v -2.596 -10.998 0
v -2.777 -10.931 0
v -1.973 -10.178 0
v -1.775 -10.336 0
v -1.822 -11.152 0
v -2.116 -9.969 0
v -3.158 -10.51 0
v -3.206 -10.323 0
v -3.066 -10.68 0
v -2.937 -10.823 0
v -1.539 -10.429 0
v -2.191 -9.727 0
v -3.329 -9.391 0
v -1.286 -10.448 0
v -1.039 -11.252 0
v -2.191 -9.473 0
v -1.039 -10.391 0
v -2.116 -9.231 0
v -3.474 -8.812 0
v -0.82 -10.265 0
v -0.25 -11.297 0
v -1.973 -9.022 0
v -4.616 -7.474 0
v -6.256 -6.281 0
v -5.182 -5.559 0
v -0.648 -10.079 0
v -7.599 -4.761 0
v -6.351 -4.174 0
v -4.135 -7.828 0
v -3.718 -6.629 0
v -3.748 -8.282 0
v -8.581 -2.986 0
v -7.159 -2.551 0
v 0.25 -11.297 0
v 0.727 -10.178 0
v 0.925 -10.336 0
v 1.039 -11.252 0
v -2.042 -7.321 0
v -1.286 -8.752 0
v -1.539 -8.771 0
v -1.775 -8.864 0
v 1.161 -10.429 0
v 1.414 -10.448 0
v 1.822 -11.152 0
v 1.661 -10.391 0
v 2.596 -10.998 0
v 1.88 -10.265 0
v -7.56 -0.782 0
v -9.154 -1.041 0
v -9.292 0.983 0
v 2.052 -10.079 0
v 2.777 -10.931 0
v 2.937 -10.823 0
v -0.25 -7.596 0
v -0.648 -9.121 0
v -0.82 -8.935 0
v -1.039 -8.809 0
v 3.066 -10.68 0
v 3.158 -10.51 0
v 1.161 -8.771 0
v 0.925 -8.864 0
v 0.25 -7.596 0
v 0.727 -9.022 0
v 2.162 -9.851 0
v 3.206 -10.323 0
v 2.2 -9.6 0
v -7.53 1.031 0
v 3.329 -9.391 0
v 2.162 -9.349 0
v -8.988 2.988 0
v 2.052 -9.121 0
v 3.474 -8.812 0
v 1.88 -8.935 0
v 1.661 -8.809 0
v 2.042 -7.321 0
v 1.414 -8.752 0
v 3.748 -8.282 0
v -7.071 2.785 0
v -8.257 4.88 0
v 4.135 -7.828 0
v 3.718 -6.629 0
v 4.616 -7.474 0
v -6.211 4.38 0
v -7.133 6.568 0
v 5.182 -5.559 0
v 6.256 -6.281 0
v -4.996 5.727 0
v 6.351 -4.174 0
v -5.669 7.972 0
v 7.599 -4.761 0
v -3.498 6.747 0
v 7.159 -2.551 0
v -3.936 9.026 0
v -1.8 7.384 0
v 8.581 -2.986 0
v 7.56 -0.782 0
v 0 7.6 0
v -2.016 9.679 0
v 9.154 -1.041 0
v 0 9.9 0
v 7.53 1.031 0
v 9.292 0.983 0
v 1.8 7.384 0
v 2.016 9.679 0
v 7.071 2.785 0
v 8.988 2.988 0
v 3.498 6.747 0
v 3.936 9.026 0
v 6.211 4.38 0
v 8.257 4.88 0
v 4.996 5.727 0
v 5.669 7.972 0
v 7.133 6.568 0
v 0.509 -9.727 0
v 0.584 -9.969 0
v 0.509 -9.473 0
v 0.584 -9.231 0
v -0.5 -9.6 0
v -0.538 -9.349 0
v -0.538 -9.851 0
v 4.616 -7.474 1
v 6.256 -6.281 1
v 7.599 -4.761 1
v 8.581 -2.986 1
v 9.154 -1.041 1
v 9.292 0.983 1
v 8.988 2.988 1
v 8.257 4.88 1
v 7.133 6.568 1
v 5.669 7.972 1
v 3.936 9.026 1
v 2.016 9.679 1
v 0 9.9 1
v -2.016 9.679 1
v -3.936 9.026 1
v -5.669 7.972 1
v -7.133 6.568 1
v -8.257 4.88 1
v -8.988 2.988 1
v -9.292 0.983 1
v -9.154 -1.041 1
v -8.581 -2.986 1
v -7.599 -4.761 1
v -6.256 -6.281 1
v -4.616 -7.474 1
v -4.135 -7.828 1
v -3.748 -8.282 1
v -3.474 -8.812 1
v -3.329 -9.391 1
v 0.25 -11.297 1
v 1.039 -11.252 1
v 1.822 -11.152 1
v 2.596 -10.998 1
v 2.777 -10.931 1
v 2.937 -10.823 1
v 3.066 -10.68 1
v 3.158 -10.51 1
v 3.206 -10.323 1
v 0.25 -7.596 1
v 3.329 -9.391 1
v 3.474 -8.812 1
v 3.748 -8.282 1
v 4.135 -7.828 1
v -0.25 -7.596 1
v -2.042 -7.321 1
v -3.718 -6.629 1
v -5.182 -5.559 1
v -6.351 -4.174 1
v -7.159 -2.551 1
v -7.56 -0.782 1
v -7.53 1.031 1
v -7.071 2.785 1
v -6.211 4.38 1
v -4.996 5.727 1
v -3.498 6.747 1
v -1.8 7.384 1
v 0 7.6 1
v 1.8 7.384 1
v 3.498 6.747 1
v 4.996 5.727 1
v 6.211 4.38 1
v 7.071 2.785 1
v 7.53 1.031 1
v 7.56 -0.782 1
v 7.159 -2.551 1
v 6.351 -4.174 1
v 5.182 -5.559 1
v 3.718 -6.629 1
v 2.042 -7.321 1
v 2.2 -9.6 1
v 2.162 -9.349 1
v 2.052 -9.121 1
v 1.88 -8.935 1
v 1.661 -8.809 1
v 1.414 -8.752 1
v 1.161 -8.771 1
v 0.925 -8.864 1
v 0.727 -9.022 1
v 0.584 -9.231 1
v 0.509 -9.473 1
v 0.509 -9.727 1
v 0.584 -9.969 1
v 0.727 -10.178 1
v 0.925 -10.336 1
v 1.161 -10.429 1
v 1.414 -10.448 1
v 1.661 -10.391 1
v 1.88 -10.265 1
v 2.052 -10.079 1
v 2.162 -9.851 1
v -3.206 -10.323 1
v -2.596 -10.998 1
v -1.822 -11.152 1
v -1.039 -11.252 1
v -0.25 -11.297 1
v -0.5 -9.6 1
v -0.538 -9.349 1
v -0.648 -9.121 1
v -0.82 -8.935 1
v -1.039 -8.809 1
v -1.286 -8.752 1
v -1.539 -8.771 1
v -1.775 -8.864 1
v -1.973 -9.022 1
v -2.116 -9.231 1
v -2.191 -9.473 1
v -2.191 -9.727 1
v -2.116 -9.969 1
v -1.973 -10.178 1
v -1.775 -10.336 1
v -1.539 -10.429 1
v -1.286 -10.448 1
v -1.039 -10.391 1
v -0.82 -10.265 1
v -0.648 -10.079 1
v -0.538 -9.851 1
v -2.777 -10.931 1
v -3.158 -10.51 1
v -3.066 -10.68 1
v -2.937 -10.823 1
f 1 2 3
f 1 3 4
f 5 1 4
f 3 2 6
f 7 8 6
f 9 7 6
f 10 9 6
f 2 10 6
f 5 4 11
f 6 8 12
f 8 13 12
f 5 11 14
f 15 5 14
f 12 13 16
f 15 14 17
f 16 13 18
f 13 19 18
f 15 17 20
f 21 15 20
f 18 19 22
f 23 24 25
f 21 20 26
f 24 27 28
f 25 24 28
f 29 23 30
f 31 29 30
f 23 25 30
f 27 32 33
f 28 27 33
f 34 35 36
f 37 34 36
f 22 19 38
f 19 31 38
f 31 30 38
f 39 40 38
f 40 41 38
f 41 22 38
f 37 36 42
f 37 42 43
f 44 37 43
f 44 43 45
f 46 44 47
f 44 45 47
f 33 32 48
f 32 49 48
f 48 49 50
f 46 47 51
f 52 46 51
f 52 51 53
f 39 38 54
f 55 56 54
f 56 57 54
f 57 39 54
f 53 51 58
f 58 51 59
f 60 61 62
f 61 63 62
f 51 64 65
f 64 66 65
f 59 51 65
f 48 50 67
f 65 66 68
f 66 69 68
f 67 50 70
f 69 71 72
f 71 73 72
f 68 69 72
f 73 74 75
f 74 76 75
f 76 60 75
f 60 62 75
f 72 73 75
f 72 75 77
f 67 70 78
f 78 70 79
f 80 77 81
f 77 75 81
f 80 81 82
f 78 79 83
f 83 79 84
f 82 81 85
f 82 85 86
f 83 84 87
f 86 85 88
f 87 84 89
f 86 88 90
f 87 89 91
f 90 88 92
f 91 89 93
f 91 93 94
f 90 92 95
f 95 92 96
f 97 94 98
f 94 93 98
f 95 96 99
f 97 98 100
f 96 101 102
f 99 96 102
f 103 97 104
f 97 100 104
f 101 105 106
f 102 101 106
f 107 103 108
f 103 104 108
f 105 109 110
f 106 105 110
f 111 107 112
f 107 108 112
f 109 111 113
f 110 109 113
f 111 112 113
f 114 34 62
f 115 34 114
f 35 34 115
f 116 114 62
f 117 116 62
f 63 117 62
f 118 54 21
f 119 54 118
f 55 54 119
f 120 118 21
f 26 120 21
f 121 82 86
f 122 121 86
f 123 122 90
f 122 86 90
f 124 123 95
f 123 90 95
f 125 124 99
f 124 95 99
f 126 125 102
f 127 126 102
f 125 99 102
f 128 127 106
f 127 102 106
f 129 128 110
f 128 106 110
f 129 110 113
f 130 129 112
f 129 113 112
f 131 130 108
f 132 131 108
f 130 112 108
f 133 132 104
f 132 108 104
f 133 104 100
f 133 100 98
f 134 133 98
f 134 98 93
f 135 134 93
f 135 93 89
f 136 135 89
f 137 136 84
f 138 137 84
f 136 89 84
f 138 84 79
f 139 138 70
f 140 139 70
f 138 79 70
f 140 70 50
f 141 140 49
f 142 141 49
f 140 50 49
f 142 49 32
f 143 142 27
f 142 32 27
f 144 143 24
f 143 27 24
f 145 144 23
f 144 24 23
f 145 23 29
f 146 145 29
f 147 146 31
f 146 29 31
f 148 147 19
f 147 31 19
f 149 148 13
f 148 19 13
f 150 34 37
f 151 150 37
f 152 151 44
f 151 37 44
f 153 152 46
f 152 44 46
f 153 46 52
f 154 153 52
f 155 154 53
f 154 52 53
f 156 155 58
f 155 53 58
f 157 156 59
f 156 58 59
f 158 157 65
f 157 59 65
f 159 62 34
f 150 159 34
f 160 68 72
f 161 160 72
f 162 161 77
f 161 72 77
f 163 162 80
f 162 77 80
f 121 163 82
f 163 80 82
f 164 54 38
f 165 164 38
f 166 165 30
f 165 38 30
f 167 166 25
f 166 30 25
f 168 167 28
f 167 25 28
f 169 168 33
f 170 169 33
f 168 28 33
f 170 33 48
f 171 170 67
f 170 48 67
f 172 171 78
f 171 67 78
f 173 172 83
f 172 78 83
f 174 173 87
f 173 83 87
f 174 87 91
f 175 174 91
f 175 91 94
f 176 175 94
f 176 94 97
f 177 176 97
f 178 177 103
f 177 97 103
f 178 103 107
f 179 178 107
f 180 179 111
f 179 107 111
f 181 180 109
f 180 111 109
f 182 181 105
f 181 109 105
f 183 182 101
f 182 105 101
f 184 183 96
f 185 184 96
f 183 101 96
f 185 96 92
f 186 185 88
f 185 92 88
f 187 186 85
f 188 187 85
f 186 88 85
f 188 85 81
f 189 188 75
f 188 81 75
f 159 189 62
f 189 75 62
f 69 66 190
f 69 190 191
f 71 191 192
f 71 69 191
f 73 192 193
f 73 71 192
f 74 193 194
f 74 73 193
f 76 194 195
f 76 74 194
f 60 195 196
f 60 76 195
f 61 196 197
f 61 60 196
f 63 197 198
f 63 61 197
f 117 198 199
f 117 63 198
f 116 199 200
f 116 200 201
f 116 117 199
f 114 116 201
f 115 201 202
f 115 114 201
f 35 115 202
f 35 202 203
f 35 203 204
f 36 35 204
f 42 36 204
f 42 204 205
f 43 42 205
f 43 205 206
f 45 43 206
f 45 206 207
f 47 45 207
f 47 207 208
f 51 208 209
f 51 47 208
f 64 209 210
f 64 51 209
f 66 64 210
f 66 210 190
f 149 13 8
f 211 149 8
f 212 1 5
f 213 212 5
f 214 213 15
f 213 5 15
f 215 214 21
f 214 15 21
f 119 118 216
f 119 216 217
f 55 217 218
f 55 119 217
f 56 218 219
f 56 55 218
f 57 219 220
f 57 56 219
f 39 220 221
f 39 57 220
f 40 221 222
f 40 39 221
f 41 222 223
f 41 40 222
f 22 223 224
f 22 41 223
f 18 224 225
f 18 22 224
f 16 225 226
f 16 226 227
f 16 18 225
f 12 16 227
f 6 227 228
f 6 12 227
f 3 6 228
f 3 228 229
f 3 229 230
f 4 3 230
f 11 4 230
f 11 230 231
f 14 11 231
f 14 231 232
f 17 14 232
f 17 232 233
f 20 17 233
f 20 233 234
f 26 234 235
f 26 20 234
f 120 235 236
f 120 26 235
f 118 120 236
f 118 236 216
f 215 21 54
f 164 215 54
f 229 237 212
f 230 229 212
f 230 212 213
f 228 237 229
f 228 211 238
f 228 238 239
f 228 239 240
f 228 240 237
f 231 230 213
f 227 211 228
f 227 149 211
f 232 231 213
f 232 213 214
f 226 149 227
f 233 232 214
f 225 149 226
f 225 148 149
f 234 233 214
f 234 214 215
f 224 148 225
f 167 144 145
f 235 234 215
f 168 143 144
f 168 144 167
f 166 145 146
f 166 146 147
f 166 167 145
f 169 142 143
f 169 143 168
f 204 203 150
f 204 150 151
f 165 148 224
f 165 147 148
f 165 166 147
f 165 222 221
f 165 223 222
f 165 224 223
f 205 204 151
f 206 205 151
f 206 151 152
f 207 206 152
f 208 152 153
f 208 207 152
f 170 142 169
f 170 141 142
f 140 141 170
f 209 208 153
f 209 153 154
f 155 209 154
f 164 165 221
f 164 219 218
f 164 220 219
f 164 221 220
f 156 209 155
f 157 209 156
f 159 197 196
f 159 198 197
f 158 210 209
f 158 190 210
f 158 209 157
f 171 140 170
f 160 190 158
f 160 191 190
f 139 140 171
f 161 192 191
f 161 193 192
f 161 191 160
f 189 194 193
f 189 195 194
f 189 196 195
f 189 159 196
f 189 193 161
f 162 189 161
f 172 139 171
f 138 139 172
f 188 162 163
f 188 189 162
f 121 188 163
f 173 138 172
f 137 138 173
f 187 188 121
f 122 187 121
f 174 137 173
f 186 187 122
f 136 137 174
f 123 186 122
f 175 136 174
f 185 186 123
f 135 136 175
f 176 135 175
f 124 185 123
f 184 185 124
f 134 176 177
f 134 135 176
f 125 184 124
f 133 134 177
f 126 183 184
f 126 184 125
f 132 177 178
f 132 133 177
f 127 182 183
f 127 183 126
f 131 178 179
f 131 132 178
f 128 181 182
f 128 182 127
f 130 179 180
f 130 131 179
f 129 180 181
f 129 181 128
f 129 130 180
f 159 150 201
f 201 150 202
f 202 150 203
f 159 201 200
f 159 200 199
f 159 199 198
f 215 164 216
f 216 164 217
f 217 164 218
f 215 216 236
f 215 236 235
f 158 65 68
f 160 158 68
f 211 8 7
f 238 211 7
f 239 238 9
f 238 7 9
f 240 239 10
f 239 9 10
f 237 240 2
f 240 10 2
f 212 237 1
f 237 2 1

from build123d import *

# Parameters (mm, degrees)
F0_R     = 0.85
F1_DEPTH = 1


with BuildPart() as f1:
    # F0 (on Top) → F1 (new body)
    with BuildSketch(Plane.XY):
        with BuildLine():
            ThreePointArc((-0.25, -7.595887), (0, 7.6), (0.25, -7.595887))
            Line((0.25, -7.595887), (0.25, -11.297234))
            ThreePointArc((0.25, -11.297234), (1.431103, -11.209012), (2.596485, -10.997648))
            ThreePointArc((2.596485, -10.997648), (3.006169, -10.755478), (3.205819, -10.323475))
            Line((3.205819, -10.323475), (3.328522, -9.391454))
            ThreePointArc((3.328522, -9.391454), (3.747523, -8.281762), (4.615831, -7.473667))
            ThreePointArc((4.615831, -7.473667), (0, 9.9), (-4.615831, -7.473667))
            ThreePointArc((-4.615831, -7.473667), (-3.747523, -8.281762), (-3.328522, -9.391454))
            Line((-3.328522, -9.391454), (-3.205819, -10.323475))
            ThreePointArc((-3.205819, -10.323475), (-3.006169, -10.755478), (-2.596485, -10.997648))
            ThreePointArc((-2.596485, -10.997648), (-1.431103, -11.209012), (-0.25, -11.297234))
            Line((-0.25, -11.297234), (-0.25, -7.595887))
        make_face()
        with Locations((-1.35, -9.6)):
            Circle(F0_R, mode=Mode.SUBTRACT)
        with Locations((1.35, -9.6)):
            Circle(F0_R, mode=Mode.SUBTRACT)
    extrude(amount=F1_DEPTH)


solid = f1.part
